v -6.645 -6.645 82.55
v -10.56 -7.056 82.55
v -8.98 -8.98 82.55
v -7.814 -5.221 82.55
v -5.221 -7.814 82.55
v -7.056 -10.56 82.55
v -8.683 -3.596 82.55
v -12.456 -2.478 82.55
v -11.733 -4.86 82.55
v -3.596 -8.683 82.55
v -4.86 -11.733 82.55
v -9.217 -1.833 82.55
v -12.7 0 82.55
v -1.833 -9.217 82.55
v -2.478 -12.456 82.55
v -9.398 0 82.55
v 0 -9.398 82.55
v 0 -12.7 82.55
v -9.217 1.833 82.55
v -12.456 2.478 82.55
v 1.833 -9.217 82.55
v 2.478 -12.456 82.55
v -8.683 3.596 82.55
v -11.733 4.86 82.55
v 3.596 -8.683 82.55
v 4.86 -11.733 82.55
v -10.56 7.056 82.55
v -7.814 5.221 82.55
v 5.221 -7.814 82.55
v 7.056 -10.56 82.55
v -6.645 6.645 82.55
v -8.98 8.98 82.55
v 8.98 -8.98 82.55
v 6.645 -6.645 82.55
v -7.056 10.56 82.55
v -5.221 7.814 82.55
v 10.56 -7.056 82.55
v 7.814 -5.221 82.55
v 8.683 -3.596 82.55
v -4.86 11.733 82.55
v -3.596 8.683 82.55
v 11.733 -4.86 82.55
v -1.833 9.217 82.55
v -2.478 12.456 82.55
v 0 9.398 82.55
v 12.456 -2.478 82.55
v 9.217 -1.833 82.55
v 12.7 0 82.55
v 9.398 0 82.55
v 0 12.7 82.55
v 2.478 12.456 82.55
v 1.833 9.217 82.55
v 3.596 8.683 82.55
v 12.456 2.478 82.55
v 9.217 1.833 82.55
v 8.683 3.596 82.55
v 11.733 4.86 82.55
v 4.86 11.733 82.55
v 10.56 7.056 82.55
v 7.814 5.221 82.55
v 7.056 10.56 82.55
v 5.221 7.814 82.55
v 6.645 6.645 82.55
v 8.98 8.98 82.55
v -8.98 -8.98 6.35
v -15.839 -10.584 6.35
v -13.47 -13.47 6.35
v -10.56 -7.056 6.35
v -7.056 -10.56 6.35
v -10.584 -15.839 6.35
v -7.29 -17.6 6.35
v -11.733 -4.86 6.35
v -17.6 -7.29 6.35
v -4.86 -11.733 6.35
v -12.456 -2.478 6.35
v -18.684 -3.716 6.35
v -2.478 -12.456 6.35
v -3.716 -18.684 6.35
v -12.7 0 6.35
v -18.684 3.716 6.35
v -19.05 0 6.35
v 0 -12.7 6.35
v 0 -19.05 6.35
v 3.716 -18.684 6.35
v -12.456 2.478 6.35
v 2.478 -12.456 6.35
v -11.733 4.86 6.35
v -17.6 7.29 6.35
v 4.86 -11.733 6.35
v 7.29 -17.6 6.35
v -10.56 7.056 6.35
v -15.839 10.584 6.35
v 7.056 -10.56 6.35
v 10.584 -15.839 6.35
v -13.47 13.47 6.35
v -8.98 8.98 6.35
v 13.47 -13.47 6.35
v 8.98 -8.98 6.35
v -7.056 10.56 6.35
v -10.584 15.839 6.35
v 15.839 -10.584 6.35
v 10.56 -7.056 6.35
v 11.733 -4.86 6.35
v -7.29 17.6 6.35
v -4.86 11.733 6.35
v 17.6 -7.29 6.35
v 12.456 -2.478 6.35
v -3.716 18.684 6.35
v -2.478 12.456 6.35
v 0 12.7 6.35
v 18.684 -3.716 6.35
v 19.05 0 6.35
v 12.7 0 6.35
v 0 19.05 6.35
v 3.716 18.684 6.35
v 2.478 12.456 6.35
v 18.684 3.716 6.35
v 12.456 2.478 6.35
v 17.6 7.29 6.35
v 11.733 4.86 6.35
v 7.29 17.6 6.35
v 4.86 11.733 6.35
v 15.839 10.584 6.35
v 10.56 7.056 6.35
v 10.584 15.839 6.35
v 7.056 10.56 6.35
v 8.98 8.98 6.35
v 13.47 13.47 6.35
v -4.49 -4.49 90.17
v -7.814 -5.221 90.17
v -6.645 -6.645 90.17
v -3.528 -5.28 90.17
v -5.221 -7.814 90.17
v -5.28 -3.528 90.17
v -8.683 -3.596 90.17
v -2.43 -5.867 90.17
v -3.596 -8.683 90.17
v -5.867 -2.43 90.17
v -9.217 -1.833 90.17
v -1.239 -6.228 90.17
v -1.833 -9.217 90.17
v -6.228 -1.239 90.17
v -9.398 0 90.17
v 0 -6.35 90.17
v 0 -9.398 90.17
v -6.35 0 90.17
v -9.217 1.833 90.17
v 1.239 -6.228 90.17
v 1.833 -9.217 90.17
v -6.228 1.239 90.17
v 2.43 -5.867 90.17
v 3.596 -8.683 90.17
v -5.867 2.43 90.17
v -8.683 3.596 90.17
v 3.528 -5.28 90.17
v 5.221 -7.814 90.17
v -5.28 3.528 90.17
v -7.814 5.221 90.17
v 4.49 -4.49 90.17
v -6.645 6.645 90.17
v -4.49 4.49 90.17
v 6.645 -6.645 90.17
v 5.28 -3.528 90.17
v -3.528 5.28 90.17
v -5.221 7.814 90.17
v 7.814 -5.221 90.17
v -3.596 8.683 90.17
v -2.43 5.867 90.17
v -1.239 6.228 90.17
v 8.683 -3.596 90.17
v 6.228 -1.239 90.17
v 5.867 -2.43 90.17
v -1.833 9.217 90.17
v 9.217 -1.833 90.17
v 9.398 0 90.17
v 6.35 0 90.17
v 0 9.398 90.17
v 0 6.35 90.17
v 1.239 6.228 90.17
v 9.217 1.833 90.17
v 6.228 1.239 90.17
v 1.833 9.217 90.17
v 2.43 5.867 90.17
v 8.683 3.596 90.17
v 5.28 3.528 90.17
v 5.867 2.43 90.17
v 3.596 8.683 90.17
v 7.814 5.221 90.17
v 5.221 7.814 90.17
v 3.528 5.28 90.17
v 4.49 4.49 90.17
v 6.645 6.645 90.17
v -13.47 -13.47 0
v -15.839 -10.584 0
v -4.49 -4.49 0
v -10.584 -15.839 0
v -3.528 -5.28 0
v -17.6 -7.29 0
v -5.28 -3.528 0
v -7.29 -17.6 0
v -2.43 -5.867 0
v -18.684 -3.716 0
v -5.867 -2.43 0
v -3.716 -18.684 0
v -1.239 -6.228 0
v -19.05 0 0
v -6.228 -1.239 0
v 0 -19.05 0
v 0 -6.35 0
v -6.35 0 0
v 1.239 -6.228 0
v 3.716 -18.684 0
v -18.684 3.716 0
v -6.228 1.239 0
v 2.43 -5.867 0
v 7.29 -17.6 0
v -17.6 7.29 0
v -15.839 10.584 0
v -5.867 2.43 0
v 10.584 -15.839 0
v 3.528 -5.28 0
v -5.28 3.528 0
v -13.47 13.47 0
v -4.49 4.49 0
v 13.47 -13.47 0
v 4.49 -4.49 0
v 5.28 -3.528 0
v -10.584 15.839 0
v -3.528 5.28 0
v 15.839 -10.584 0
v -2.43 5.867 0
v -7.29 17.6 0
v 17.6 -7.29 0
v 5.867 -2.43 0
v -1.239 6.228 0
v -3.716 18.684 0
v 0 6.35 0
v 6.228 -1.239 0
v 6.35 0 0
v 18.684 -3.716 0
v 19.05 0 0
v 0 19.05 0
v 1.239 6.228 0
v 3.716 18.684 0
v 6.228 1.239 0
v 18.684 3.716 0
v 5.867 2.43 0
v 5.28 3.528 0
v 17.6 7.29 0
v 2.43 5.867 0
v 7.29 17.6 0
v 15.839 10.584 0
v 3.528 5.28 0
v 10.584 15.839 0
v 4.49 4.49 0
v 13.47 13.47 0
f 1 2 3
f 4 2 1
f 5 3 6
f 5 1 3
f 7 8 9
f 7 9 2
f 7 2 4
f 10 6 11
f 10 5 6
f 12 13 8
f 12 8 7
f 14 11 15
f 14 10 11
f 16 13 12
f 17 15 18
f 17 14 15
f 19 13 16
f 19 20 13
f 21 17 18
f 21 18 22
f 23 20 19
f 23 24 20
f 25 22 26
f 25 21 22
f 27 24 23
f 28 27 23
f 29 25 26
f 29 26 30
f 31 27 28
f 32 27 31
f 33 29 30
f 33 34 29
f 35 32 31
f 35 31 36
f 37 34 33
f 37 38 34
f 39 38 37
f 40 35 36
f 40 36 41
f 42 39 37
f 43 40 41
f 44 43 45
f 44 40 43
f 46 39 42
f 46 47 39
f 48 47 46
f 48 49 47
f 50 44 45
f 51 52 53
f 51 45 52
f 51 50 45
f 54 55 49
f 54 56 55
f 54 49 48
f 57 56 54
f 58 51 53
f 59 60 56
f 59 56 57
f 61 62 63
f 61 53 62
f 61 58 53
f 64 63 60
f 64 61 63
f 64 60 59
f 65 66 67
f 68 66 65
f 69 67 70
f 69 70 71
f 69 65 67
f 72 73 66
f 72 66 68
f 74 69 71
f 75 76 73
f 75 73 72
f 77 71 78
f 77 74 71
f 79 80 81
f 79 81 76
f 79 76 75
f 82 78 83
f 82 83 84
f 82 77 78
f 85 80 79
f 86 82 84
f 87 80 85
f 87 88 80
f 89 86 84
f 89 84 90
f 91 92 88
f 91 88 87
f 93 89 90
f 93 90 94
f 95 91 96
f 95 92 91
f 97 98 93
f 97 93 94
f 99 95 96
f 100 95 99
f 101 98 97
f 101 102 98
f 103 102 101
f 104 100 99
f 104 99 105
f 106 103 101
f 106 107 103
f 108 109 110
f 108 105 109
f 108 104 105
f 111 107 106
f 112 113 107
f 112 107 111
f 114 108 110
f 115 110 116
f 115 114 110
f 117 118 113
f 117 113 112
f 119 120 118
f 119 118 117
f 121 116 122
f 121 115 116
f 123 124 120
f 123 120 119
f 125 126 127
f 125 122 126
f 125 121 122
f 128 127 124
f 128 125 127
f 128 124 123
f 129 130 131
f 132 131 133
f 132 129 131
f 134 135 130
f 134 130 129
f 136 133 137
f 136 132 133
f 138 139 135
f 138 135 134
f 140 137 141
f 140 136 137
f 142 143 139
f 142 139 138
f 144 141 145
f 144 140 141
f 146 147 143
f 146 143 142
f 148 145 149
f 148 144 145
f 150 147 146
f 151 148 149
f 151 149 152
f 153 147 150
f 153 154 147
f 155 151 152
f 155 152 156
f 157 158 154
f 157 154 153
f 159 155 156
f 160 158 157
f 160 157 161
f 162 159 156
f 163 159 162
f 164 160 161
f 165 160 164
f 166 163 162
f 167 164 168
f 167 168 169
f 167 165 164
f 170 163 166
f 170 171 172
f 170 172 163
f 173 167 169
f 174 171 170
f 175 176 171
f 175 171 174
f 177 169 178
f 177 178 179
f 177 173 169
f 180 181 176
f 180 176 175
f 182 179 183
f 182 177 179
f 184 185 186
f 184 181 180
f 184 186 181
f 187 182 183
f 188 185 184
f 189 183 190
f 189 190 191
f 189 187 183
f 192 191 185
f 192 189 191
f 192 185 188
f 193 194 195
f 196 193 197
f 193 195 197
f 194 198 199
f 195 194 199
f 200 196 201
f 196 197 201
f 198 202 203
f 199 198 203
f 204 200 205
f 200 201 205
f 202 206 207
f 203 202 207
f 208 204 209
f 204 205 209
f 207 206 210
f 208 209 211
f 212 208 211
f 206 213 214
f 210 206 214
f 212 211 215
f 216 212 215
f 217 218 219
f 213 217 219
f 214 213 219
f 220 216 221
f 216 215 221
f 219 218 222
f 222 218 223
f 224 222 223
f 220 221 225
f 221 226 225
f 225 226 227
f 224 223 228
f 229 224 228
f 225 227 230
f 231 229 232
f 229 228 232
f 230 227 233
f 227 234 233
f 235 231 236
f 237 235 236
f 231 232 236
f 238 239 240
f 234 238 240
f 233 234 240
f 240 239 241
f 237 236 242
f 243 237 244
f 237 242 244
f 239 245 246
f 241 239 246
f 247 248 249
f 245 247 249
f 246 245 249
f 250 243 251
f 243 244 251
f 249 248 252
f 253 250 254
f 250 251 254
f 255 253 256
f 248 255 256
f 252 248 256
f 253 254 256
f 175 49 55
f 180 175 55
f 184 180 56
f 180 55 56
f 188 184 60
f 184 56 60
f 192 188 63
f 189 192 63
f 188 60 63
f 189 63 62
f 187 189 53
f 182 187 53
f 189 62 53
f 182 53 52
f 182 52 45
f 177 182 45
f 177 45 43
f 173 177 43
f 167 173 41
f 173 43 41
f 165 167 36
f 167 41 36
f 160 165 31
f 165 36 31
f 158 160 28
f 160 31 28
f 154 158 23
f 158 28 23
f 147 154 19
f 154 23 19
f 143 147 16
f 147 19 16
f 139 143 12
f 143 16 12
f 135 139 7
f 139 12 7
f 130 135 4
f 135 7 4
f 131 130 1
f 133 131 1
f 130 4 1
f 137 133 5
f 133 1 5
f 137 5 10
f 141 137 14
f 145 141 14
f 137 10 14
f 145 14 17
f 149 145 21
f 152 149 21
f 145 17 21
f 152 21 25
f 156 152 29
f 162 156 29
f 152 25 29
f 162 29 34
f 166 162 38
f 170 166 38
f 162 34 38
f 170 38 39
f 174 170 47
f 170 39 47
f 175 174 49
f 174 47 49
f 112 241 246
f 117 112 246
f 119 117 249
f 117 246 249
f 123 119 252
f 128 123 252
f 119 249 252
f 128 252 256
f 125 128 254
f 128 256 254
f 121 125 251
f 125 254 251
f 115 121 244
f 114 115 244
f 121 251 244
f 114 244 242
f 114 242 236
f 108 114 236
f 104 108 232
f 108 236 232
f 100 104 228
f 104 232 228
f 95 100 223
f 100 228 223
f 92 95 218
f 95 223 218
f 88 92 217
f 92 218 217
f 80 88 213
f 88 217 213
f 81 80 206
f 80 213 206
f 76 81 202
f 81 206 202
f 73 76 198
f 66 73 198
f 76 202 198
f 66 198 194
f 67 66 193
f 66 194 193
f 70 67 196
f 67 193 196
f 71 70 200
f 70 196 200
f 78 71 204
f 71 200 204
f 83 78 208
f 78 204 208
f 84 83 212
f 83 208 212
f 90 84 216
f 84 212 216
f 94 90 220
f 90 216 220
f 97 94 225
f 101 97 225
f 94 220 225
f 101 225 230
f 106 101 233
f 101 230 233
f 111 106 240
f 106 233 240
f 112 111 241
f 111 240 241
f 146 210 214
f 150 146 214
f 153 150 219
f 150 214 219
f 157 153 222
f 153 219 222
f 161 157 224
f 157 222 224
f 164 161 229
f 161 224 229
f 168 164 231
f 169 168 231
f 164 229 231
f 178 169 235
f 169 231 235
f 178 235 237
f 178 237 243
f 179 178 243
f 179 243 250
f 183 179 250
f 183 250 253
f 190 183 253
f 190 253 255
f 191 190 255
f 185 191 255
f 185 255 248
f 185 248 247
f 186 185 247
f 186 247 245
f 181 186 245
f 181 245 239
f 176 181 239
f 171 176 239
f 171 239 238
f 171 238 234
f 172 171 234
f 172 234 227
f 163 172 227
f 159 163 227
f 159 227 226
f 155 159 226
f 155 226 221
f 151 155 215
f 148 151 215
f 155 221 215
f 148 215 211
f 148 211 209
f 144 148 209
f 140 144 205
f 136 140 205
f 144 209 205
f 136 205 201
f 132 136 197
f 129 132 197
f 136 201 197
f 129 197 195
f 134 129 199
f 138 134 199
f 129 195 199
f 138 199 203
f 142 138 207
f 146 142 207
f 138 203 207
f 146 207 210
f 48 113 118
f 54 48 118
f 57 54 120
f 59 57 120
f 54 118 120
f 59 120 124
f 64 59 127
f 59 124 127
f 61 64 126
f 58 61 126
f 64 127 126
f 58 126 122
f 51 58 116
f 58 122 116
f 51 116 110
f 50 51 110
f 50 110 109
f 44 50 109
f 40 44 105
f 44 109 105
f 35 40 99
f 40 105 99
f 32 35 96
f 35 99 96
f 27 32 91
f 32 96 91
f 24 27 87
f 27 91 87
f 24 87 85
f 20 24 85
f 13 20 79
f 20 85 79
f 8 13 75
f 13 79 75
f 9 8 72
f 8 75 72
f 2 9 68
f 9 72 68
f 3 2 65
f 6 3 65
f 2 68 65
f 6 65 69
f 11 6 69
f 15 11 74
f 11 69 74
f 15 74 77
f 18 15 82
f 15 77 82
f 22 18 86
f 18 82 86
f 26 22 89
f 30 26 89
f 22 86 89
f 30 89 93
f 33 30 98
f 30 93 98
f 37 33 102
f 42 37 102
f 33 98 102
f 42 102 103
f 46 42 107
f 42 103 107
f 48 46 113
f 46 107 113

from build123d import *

# Parameters (mm, degrees)
F0_R     = 19.05
F1_DEPTH = 6.35
F2_R     = 12.7
F3_DEPTH = 76.2
F4_R     = 9.398
F5_DEPTH = 7.62
F7_D     = 12.7


with BuildPart() as f1:
    # F0 (on Top) → F1 (new body)
    with BuildSketch(Plane.XY):
        Circle(F0_R)
    extrude(amount=F1_DEPTH)

    # F2 (on face) → F3 (join)
    with BuildSketch(Plane.XY.offset(6.35)):
        Circle(F2_R)
    extrude(amount=F3_DEPTH)

    # F4 (on face) → F5 (join)
    with BuildSketch(Plane.XY.offset(82.55)):
        Circle(F4_R)
    extrude(amount=F5_DEPTH)

    # F7 (through all)
    with Locations(Plane.XY.offset(90.17)):
        with Locations((0, 0)):
            Hole(F7_D / 2)


solid = f1.part
